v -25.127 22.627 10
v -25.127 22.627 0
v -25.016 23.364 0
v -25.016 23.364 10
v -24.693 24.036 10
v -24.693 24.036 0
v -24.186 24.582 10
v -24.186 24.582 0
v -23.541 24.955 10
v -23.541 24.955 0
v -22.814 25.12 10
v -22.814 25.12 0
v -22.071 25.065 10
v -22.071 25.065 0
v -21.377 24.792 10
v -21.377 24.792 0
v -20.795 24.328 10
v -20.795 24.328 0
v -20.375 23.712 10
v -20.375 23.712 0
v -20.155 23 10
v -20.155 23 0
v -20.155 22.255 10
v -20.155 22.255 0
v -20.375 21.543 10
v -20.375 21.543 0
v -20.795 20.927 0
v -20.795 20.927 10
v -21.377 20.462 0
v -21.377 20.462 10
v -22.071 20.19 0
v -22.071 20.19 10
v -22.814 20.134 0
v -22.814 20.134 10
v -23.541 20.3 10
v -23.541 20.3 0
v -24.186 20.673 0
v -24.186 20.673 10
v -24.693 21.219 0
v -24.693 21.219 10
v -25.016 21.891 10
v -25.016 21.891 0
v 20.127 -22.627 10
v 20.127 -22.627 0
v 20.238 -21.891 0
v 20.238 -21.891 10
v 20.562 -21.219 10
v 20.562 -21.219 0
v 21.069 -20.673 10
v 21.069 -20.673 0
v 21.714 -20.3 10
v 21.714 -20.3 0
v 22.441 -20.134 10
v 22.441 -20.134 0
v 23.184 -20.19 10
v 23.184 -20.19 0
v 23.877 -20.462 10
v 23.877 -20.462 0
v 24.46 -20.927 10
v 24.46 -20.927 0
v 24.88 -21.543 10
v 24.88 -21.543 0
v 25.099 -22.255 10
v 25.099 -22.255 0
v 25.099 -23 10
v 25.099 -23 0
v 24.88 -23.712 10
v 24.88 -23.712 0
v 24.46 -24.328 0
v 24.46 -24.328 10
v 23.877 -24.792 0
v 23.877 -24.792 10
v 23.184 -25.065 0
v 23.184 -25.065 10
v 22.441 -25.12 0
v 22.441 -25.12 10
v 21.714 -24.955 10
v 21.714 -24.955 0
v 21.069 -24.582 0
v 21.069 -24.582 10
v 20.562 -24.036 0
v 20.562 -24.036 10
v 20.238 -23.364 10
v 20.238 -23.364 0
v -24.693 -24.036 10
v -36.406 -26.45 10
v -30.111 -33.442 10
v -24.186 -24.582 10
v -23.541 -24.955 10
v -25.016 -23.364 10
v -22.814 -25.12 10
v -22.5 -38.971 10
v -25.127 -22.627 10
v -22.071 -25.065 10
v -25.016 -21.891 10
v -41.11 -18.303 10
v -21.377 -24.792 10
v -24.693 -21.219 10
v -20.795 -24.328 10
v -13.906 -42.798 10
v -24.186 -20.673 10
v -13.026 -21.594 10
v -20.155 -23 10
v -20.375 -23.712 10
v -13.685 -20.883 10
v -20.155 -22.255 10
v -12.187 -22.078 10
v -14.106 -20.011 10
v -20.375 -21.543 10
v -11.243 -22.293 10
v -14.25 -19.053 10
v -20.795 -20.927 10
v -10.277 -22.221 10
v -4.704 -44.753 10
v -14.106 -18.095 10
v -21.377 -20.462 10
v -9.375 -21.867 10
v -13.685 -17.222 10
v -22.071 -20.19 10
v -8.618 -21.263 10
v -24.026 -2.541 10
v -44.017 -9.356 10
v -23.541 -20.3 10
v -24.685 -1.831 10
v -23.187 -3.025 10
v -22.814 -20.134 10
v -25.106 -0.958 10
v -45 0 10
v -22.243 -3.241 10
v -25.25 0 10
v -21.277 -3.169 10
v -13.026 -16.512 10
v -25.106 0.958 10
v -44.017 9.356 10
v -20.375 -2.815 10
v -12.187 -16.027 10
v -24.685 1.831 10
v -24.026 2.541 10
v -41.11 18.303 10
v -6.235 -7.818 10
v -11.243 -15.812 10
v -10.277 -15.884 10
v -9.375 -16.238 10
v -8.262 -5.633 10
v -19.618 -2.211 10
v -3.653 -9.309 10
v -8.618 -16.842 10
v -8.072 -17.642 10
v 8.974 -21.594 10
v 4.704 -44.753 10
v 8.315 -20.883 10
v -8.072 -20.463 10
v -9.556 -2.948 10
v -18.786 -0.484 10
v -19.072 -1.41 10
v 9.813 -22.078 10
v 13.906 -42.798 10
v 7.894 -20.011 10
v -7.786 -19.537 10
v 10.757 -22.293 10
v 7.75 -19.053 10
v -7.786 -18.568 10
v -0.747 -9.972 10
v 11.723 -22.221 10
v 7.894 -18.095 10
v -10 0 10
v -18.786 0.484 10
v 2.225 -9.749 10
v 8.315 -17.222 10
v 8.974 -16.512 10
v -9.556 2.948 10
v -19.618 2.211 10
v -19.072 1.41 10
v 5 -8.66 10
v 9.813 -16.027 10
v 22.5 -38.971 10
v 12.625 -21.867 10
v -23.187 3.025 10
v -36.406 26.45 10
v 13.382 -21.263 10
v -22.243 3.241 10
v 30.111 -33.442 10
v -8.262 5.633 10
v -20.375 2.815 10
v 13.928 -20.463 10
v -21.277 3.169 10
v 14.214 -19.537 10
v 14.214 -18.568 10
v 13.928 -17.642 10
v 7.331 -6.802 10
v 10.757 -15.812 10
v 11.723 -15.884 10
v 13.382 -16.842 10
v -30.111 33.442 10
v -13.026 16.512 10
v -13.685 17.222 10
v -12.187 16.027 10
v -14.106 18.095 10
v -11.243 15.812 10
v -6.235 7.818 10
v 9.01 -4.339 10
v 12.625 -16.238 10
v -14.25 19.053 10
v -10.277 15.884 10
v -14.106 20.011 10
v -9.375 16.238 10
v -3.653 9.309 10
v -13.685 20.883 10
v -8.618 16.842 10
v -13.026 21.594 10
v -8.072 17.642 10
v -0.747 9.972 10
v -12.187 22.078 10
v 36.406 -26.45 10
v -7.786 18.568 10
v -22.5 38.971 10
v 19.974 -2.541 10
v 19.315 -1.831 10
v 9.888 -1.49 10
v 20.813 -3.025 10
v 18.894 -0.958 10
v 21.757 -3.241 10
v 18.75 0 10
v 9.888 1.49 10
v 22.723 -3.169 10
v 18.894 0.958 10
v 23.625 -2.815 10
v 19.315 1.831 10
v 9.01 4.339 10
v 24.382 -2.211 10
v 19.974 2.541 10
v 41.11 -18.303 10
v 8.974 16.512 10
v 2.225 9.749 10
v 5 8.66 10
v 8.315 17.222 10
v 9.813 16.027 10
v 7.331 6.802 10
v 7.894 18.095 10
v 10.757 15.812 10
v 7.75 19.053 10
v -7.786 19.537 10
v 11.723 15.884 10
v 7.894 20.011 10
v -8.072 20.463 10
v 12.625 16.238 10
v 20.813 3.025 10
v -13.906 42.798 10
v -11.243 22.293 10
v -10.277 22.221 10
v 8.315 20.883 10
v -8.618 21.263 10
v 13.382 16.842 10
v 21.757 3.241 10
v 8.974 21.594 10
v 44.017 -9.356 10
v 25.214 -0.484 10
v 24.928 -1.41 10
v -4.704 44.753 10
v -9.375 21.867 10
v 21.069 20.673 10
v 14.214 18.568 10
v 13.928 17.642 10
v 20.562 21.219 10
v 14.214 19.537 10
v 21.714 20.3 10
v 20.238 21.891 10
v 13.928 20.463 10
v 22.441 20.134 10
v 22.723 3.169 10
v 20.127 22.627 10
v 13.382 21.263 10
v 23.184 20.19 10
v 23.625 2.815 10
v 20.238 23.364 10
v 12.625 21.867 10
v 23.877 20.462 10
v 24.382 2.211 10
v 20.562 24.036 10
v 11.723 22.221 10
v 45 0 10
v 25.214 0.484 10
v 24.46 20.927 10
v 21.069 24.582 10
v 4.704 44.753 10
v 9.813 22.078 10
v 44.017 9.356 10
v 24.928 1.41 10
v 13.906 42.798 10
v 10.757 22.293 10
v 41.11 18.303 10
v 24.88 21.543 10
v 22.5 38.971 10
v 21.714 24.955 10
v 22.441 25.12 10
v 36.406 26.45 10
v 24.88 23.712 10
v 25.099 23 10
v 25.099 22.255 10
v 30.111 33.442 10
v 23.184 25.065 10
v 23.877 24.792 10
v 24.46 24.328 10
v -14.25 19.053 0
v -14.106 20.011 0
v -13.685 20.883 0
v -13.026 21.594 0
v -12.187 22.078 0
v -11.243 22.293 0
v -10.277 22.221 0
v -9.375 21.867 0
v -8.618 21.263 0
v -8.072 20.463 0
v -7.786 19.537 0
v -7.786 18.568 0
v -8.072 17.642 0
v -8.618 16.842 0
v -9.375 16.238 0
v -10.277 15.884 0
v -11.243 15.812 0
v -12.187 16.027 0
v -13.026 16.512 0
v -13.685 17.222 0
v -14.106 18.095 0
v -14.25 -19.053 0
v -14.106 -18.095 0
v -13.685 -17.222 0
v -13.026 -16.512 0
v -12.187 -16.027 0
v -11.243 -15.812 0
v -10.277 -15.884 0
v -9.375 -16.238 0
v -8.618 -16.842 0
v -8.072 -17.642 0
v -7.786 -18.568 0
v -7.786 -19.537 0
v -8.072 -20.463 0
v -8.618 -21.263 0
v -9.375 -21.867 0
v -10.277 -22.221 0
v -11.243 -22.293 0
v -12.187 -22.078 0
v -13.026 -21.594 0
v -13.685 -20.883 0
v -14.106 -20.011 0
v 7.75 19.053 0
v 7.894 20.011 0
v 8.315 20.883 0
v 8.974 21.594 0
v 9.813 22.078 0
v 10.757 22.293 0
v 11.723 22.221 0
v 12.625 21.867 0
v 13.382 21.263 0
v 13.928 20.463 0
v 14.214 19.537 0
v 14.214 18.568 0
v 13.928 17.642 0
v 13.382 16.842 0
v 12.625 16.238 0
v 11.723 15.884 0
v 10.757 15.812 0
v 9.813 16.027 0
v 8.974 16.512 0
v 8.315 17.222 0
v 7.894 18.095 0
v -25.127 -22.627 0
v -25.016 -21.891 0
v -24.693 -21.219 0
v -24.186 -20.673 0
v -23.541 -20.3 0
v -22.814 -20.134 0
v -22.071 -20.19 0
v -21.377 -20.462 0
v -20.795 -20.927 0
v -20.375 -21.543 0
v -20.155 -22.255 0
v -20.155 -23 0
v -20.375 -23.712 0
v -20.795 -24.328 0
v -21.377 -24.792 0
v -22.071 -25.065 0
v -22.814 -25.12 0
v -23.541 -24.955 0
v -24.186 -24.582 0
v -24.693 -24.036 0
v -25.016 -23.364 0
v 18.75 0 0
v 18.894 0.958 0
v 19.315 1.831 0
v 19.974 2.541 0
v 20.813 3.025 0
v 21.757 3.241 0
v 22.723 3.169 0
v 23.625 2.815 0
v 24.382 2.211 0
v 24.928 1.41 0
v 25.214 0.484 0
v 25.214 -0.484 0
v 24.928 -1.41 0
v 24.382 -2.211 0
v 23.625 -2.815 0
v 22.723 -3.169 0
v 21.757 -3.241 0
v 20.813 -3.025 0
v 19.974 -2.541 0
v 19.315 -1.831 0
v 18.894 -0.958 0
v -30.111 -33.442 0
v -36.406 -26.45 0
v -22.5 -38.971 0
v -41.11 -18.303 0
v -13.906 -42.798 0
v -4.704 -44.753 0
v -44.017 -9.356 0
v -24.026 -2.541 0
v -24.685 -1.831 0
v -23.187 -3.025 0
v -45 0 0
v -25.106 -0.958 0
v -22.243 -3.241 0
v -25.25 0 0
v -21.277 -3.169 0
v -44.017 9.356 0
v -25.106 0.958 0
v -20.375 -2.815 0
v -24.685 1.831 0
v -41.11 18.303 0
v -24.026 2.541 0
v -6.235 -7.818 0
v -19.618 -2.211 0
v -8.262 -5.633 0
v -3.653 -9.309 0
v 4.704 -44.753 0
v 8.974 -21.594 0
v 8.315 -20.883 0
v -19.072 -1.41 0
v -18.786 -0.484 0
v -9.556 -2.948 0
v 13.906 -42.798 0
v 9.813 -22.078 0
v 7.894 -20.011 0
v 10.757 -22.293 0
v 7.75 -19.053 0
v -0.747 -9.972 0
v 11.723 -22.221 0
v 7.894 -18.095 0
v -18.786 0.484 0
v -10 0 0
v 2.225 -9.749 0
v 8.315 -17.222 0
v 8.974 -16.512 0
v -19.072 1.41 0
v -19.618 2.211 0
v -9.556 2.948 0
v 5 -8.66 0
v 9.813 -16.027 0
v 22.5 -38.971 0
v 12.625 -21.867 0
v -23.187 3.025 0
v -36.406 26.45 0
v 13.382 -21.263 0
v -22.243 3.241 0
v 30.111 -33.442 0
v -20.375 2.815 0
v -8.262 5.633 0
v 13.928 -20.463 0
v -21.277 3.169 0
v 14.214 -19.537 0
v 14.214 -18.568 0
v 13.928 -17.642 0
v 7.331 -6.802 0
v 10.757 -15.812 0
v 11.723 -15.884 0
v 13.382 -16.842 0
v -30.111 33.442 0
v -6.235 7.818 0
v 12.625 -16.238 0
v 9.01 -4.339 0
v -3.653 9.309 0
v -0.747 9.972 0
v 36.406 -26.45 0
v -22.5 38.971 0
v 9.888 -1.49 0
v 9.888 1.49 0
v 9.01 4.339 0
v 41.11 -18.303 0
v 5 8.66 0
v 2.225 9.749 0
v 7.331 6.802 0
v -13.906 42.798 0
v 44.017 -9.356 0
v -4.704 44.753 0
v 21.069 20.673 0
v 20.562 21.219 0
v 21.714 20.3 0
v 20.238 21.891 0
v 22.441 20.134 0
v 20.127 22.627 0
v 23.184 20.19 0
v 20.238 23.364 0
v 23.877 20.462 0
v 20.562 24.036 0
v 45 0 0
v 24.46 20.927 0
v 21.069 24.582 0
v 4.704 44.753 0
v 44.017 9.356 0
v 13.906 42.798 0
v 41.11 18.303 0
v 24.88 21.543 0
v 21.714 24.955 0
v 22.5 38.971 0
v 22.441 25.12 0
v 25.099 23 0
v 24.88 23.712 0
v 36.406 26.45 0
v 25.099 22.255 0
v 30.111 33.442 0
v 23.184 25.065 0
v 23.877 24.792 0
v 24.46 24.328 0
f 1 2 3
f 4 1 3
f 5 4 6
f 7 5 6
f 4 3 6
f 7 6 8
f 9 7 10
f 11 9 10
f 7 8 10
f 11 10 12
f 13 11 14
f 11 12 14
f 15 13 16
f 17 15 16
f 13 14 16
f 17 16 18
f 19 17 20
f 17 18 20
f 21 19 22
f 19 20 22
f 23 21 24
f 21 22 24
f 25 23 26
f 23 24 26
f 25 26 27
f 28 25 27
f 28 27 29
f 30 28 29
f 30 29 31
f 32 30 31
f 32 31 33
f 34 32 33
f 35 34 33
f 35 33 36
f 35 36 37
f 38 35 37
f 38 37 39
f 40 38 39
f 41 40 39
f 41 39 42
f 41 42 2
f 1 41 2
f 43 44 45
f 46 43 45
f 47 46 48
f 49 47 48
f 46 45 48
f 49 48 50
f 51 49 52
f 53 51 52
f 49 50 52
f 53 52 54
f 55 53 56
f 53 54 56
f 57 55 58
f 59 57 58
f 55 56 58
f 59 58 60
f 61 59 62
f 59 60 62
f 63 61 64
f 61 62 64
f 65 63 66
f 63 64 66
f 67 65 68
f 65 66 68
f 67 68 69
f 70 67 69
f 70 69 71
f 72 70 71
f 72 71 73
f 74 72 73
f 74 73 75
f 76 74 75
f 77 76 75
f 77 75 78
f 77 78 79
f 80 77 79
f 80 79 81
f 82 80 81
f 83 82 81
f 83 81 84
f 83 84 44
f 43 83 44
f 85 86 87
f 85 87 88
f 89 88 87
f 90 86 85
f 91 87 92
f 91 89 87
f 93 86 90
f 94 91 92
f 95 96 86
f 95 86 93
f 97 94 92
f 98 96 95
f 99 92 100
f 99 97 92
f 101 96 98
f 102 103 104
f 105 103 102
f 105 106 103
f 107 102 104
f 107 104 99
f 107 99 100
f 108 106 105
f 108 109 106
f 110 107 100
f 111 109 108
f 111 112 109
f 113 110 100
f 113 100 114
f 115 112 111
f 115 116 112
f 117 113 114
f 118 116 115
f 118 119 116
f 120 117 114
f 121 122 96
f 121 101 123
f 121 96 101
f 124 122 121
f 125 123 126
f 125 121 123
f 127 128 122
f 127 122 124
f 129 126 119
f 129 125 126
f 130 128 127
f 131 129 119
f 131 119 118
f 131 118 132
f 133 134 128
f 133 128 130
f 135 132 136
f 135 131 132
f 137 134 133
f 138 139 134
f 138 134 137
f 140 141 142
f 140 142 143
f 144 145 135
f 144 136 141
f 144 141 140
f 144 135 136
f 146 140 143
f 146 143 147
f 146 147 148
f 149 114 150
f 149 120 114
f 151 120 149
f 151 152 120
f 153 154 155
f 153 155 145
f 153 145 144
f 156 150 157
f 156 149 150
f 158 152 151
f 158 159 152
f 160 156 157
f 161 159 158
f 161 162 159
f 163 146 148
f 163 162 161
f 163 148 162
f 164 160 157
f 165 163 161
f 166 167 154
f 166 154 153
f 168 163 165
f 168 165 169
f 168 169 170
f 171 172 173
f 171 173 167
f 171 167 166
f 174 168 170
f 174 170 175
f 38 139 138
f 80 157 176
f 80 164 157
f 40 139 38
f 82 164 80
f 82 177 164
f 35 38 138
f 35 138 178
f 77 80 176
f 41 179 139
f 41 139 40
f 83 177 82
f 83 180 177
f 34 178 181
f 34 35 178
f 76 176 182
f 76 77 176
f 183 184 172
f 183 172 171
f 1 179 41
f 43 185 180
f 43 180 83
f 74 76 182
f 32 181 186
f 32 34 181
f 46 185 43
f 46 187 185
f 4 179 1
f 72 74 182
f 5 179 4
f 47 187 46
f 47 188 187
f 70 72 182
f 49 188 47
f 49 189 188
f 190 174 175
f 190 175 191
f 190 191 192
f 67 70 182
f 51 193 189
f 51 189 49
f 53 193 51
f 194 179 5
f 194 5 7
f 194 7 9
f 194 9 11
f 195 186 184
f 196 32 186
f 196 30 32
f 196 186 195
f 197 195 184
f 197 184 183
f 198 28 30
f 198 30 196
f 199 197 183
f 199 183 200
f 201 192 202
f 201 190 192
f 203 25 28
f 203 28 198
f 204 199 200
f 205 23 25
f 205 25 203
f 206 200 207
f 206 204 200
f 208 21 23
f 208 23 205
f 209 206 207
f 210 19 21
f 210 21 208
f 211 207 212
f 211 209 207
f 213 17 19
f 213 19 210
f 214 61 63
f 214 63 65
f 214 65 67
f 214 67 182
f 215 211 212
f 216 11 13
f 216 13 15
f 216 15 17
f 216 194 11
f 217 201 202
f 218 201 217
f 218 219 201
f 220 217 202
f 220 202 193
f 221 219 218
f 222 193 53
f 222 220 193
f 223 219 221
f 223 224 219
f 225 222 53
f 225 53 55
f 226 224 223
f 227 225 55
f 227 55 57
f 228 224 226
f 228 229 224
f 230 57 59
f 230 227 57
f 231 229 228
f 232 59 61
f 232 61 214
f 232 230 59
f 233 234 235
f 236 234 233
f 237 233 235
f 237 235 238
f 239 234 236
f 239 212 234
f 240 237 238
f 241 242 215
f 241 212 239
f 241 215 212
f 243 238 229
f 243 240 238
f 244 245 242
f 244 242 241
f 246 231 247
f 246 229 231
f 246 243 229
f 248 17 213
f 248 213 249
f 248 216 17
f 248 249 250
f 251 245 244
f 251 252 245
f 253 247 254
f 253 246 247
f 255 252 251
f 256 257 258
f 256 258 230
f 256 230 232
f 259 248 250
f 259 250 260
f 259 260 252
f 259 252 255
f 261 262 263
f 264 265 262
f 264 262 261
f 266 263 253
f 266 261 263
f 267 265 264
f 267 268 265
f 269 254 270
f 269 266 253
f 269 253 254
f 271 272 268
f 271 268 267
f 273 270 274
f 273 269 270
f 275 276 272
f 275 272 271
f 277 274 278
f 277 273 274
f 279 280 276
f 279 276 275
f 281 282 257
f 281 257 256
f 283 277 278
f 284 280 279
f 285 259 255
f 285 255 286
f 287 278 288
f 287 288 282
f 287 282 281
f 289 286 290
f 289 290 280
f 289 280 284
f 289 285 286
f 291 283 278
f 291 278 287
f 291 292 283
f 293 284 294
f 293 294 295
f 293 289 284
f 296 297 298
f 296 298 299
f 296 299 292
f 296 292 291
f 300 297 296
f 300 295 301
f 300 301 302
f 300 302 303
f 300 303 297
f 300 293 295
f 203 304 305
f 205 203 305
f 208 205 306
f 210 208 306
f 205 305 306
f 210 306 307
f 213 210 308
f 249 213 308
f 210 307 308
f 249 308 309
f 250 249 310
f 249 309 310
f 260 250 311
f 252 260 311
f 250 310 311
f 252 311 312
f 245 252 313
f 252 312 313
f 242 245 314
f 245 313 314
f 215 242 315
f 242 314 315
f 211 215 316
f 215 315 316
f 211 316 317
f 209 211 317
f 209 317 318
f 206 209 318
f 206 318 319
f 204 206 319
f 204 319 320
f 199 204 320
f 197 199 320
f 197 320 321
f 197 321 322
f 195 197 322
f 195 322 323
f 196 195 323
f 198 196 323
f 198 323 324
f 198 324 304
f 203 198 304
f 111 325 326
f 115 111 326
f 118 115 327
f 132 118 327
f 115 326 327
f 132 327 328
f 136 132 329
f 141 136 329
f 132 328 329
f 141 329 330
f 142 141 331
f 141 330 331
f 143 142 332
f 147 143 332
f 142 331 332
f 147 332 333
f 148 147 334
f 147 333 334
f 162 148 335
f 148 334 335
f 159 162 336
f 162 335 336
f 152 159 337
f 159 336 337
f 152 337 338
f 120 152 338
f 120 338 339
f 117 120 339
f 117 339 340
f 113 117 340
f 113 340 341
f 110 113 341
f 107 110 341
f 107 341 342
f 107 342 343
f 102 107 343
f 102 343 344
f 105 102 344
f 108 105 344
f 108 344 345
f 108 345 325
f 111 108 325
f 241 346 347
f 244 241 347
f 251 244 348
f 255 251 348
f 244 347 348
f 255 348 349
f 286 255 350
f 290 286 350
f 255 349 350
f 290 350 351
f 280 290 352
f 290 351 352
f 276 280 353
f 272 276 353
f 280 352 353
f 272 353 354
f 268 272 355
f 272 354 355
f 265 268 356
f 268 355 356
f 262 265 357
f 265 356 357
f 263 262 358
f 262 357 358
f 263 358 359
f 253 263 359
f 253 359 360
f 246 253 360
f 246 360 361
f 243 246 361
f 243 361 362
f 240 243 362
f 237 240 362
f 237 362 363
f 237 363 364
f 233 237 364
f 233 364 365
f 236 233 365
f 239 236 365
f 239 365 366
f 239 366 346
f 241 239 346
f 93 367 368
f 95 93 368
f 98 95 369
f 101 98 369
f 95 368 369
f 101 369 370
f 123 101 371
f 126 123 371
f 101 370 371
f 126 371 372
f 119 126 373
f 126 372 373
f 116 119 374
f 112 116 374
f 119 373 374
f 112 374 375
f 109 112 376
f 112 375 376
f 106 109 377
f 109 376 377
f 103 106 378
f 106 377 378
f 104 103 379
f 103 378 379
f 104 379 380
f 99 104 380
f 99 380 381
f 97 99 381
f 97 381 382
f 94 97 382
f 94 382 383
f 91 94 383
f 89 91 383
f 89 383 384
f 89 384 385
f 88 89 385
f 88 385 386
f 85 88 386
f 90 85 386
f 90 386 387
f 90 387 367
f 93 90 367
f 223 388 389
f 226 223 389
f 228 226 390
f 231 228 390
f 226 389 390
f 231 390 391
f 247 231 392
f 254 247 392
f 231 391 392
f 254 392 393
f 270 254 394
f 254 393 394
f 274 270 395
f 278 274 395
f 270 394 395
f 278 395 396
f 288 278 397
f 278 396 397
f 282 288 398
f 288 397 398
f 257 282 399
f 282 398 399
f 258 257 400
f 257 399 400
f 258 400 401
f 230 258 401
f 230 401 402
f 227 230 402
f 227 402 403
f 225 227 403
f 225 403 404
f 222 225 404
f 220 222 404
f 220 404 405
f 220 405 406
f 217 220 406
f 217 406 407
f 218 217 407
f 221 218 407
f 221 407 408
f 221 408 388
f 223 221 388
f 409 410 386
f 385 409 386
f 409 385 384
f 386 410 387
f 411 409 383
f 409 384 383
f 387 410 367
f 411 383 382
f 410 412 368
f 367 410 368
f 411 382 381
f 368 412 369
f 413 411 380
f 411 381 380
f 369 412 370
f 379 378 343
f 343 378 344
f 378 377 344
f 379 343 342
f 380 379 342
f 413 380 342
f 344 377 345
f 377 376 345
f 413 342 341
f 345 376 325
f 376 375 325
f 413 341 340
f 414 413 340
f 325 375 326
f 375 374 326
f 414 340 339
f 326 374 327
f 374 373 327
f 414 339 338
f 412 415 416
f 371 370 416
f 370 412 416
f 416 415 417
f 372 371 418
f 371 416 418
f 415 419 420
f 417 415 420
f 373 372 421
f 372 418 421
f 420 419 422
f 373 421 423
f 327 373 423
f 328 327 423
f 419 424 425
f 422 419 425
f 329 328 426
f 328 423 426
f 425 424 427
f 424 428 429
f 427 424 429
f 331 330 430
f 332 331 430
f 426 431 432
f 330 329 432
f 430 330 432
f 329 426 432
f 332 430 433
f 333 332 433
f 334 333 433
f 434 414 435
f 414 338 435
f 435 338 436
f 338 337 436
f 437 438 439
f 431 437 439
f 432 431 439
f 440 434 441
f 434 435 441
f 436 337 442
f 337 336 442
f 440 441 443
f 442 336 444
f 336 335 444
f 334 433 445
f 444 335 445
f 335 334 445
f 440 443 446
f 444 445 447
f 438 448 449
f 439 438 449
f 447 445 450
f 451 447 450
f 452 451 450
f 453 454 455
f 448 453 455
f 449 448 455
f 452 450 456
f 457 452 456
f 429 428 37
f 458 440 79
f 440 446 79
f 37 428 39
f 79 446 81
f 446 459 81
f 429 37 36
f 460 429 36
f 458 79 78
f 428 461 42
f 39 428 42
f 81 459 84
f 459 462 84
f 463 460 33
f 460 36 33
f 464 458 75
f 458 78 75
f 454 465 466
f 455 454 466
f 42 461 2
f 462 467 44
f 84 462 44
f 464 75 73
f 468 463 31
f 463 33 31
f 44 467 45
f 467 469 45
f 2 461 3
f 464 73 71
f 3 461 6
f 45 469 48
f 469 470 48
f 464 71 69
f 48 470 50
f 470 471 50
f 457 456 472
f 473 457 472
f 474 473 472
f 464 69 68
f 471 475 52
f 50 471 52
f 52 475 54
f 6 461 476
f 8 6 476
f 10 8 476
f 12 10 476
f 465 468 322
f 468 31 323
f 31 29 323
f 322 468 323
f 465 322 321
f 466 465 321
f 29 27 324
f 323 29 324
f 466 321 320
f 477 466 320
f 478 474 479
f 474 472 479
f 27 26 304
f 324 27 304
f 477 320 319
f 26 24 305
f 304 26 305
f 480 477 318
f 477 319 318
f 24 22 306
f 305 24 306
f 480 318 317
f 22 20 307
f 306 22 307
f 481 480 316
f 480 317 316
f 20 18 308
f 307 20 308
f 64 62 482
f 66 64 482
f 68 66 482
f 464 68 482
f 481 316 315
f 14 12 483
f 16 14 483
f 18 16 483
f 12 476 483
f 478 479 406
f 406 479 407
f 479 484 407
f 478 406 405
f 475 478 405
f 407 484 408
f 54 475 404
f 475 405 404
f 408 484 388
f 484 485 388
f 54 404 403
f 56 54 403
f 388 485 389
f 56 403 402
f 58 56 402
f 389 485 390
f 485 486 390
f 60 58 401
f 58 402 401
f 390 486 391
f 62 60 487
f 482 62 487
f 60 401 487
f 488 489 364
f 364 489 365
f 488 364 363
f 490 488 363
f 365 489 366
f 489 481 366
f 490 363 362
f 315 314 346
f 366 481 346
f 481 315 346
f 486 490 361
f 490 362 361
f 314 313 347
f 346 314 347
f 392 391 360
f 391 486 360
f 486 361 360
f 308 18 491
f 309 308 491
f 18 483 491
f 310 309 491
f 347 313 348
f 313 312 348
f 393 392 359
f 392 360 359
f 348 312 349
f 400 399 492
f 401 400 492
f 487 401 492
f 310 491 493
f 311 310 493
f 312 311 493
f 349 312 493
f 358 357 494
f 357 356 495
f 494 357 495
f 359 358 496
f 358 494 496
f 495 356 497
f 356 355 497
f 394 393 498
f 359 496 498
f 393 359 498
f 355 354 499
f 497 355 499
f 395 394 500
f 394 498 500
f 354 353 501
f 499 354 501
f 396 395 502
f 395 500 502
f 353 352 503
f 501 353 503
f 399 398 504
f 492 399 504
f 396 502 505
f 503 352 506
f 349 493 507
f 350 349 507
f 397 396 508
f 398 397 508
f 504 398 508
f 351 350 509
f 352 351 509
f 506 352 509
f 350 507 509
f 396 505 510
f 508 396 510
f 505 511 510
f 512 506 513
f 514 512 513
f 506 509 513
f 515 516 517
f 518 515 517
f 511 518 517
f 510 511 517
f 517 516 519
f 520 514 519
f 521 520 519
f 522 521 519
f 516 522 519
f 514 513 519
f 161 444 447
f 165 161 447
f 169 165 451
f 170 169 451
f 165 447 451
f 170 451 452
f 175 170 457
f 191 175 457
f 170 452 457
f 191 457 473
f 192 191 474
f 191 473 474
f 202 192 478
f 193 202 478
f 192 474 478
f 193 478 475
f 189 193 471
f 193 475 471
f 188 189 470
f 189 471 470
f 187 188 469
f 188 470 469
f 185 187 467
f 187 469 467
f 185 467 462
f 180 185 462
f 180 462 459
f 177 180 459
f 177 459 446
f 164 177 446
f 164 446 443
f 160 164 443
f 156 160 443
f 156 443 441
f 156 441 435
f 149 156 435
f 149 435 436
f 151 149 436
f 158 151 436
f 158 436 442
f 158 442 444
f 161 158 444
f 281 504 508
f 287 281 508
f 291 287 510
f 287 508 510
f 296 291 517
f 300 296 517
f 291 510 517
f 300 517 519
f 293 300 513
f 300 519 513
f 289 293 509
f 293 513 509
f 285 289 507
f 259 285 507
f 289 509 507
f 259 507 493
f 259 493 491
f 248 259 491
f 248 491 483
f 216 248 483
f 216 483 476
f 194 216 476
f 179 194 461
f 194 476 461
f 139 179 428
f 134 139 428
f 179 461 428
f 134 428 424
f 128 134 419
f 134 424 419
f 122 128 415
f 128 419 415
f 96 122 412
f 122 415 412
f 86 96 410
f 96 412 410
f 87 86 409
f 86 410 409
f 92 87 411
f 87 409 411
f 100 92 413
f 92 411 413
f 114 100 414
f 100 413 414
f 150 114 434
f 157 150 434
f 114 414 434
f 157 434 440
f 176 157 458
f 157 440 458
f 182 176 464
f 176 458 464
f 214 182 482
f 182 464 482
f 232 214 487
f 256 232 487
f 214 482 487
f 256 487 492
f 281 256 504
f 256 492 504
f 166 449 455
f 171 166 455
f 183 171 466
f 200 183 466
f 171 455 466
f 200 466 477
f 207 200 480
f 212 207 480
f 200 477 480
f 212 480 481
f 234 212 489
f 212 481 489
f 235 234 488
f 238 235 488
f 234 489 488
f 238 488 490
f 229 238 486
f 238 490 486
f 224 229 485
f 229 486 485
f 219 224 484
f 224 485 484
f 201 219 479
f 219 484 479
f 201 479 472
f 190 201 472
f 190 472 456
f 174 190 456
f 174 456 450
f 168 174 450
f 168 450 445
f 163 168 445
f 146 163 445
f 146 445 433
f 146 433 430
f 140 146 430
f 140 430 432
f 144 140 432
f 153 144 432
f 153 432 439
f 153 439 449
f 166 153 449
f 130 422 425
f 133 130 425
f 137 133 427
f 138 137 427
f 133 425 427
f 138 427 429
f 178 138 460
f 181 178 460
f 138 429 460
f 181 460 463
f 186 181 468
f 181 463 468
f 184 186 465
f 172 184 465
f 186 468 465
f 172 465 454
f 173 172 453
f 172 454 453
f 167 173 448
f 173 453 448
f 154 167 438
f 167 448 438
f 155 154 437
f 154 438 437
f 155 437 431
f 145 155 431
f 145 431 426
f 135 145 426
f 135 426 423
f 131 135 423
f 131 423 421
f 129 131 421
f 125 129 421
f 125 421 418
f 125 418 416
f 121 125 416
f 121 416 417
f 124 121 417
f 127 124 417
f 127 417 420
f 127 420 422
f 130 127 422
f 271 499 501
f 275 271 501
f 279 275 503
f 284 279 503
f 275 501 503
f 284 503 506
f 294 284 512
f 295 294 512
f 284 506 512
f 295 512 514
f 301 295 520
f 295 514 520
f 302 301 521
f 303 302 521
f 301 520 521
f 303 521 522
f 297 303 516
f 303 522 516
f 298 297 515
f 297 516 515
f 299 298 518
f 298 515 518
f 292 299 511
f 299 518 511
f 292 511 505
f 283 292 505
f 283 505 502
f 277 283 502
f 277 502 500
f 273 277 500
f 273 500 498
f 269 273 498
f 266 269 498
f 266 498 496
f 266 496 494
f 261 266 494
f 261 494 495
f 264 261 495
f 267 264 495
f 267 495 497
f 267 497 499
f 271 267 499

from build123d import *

# Parameters (mm, degrees)
SKETCH_1_R          = 45
EXTRUDE_1_DEPTH     = 10
SKETCH_2_R          = 10
SKETCH_2_R_2        = 3.25
SKETCH_2_R_3        = 2.5
CUT_EXTRUDE_1_DEPTH = 11


with BuildPart() as part:
    # 草图1 → 凸台-拉伸1 (new body)
    with BuildSketch(Plane.XY):
        Circle(SKETCH_1_R)
    extrude(amount=EXTRUDE_1_DEPTH)

    # 草图2 → 切除-拉伸1 (cut)
    with BuildSketch(Plane(origin=(0, 0, 0), x_dir=(-1, 0, 0), z_dir=(0, 0, -1))):
        Circle(SKETCH_2_R)
        with Locations((-22, 0)):
            Circle(SKETCH_2_R_2)
        with Locations((-11, 19.052558883)):
            Circle(SKETCH_2_R_2)
        with Locations((11, 19.052558883)):
            Circle(SKETCH_2_R_2)
        with Locations((22, 0)):
            Circle(SKETCH_2_R_2)
        with Locations((11, -19.052558883)):
            Circle(SKETCH_2_R_2)
        with Locations((-11, -19.052558883)):
            Circle(SKETCH_2_R_2)
        with Locations((-22.627416998, 22.627416998)):
            Circle(SKETCH_2_R_3)
        with Locations((22.627416998, 22.627416998)):
            Circle(SKETCH_2_R_3)
        with Locations((22.627416998, -22.627416998)):
            Circle(SKETCH_2_R_3)
        with Locations((-22.627416998, -22.627416998)):
            Circle(SKETCH_2_R_3)
    extrude(amount=-CUT_EXTRUDE_1_DEPTH, mode=Mode.SUBTRACT)


solid = part.part
